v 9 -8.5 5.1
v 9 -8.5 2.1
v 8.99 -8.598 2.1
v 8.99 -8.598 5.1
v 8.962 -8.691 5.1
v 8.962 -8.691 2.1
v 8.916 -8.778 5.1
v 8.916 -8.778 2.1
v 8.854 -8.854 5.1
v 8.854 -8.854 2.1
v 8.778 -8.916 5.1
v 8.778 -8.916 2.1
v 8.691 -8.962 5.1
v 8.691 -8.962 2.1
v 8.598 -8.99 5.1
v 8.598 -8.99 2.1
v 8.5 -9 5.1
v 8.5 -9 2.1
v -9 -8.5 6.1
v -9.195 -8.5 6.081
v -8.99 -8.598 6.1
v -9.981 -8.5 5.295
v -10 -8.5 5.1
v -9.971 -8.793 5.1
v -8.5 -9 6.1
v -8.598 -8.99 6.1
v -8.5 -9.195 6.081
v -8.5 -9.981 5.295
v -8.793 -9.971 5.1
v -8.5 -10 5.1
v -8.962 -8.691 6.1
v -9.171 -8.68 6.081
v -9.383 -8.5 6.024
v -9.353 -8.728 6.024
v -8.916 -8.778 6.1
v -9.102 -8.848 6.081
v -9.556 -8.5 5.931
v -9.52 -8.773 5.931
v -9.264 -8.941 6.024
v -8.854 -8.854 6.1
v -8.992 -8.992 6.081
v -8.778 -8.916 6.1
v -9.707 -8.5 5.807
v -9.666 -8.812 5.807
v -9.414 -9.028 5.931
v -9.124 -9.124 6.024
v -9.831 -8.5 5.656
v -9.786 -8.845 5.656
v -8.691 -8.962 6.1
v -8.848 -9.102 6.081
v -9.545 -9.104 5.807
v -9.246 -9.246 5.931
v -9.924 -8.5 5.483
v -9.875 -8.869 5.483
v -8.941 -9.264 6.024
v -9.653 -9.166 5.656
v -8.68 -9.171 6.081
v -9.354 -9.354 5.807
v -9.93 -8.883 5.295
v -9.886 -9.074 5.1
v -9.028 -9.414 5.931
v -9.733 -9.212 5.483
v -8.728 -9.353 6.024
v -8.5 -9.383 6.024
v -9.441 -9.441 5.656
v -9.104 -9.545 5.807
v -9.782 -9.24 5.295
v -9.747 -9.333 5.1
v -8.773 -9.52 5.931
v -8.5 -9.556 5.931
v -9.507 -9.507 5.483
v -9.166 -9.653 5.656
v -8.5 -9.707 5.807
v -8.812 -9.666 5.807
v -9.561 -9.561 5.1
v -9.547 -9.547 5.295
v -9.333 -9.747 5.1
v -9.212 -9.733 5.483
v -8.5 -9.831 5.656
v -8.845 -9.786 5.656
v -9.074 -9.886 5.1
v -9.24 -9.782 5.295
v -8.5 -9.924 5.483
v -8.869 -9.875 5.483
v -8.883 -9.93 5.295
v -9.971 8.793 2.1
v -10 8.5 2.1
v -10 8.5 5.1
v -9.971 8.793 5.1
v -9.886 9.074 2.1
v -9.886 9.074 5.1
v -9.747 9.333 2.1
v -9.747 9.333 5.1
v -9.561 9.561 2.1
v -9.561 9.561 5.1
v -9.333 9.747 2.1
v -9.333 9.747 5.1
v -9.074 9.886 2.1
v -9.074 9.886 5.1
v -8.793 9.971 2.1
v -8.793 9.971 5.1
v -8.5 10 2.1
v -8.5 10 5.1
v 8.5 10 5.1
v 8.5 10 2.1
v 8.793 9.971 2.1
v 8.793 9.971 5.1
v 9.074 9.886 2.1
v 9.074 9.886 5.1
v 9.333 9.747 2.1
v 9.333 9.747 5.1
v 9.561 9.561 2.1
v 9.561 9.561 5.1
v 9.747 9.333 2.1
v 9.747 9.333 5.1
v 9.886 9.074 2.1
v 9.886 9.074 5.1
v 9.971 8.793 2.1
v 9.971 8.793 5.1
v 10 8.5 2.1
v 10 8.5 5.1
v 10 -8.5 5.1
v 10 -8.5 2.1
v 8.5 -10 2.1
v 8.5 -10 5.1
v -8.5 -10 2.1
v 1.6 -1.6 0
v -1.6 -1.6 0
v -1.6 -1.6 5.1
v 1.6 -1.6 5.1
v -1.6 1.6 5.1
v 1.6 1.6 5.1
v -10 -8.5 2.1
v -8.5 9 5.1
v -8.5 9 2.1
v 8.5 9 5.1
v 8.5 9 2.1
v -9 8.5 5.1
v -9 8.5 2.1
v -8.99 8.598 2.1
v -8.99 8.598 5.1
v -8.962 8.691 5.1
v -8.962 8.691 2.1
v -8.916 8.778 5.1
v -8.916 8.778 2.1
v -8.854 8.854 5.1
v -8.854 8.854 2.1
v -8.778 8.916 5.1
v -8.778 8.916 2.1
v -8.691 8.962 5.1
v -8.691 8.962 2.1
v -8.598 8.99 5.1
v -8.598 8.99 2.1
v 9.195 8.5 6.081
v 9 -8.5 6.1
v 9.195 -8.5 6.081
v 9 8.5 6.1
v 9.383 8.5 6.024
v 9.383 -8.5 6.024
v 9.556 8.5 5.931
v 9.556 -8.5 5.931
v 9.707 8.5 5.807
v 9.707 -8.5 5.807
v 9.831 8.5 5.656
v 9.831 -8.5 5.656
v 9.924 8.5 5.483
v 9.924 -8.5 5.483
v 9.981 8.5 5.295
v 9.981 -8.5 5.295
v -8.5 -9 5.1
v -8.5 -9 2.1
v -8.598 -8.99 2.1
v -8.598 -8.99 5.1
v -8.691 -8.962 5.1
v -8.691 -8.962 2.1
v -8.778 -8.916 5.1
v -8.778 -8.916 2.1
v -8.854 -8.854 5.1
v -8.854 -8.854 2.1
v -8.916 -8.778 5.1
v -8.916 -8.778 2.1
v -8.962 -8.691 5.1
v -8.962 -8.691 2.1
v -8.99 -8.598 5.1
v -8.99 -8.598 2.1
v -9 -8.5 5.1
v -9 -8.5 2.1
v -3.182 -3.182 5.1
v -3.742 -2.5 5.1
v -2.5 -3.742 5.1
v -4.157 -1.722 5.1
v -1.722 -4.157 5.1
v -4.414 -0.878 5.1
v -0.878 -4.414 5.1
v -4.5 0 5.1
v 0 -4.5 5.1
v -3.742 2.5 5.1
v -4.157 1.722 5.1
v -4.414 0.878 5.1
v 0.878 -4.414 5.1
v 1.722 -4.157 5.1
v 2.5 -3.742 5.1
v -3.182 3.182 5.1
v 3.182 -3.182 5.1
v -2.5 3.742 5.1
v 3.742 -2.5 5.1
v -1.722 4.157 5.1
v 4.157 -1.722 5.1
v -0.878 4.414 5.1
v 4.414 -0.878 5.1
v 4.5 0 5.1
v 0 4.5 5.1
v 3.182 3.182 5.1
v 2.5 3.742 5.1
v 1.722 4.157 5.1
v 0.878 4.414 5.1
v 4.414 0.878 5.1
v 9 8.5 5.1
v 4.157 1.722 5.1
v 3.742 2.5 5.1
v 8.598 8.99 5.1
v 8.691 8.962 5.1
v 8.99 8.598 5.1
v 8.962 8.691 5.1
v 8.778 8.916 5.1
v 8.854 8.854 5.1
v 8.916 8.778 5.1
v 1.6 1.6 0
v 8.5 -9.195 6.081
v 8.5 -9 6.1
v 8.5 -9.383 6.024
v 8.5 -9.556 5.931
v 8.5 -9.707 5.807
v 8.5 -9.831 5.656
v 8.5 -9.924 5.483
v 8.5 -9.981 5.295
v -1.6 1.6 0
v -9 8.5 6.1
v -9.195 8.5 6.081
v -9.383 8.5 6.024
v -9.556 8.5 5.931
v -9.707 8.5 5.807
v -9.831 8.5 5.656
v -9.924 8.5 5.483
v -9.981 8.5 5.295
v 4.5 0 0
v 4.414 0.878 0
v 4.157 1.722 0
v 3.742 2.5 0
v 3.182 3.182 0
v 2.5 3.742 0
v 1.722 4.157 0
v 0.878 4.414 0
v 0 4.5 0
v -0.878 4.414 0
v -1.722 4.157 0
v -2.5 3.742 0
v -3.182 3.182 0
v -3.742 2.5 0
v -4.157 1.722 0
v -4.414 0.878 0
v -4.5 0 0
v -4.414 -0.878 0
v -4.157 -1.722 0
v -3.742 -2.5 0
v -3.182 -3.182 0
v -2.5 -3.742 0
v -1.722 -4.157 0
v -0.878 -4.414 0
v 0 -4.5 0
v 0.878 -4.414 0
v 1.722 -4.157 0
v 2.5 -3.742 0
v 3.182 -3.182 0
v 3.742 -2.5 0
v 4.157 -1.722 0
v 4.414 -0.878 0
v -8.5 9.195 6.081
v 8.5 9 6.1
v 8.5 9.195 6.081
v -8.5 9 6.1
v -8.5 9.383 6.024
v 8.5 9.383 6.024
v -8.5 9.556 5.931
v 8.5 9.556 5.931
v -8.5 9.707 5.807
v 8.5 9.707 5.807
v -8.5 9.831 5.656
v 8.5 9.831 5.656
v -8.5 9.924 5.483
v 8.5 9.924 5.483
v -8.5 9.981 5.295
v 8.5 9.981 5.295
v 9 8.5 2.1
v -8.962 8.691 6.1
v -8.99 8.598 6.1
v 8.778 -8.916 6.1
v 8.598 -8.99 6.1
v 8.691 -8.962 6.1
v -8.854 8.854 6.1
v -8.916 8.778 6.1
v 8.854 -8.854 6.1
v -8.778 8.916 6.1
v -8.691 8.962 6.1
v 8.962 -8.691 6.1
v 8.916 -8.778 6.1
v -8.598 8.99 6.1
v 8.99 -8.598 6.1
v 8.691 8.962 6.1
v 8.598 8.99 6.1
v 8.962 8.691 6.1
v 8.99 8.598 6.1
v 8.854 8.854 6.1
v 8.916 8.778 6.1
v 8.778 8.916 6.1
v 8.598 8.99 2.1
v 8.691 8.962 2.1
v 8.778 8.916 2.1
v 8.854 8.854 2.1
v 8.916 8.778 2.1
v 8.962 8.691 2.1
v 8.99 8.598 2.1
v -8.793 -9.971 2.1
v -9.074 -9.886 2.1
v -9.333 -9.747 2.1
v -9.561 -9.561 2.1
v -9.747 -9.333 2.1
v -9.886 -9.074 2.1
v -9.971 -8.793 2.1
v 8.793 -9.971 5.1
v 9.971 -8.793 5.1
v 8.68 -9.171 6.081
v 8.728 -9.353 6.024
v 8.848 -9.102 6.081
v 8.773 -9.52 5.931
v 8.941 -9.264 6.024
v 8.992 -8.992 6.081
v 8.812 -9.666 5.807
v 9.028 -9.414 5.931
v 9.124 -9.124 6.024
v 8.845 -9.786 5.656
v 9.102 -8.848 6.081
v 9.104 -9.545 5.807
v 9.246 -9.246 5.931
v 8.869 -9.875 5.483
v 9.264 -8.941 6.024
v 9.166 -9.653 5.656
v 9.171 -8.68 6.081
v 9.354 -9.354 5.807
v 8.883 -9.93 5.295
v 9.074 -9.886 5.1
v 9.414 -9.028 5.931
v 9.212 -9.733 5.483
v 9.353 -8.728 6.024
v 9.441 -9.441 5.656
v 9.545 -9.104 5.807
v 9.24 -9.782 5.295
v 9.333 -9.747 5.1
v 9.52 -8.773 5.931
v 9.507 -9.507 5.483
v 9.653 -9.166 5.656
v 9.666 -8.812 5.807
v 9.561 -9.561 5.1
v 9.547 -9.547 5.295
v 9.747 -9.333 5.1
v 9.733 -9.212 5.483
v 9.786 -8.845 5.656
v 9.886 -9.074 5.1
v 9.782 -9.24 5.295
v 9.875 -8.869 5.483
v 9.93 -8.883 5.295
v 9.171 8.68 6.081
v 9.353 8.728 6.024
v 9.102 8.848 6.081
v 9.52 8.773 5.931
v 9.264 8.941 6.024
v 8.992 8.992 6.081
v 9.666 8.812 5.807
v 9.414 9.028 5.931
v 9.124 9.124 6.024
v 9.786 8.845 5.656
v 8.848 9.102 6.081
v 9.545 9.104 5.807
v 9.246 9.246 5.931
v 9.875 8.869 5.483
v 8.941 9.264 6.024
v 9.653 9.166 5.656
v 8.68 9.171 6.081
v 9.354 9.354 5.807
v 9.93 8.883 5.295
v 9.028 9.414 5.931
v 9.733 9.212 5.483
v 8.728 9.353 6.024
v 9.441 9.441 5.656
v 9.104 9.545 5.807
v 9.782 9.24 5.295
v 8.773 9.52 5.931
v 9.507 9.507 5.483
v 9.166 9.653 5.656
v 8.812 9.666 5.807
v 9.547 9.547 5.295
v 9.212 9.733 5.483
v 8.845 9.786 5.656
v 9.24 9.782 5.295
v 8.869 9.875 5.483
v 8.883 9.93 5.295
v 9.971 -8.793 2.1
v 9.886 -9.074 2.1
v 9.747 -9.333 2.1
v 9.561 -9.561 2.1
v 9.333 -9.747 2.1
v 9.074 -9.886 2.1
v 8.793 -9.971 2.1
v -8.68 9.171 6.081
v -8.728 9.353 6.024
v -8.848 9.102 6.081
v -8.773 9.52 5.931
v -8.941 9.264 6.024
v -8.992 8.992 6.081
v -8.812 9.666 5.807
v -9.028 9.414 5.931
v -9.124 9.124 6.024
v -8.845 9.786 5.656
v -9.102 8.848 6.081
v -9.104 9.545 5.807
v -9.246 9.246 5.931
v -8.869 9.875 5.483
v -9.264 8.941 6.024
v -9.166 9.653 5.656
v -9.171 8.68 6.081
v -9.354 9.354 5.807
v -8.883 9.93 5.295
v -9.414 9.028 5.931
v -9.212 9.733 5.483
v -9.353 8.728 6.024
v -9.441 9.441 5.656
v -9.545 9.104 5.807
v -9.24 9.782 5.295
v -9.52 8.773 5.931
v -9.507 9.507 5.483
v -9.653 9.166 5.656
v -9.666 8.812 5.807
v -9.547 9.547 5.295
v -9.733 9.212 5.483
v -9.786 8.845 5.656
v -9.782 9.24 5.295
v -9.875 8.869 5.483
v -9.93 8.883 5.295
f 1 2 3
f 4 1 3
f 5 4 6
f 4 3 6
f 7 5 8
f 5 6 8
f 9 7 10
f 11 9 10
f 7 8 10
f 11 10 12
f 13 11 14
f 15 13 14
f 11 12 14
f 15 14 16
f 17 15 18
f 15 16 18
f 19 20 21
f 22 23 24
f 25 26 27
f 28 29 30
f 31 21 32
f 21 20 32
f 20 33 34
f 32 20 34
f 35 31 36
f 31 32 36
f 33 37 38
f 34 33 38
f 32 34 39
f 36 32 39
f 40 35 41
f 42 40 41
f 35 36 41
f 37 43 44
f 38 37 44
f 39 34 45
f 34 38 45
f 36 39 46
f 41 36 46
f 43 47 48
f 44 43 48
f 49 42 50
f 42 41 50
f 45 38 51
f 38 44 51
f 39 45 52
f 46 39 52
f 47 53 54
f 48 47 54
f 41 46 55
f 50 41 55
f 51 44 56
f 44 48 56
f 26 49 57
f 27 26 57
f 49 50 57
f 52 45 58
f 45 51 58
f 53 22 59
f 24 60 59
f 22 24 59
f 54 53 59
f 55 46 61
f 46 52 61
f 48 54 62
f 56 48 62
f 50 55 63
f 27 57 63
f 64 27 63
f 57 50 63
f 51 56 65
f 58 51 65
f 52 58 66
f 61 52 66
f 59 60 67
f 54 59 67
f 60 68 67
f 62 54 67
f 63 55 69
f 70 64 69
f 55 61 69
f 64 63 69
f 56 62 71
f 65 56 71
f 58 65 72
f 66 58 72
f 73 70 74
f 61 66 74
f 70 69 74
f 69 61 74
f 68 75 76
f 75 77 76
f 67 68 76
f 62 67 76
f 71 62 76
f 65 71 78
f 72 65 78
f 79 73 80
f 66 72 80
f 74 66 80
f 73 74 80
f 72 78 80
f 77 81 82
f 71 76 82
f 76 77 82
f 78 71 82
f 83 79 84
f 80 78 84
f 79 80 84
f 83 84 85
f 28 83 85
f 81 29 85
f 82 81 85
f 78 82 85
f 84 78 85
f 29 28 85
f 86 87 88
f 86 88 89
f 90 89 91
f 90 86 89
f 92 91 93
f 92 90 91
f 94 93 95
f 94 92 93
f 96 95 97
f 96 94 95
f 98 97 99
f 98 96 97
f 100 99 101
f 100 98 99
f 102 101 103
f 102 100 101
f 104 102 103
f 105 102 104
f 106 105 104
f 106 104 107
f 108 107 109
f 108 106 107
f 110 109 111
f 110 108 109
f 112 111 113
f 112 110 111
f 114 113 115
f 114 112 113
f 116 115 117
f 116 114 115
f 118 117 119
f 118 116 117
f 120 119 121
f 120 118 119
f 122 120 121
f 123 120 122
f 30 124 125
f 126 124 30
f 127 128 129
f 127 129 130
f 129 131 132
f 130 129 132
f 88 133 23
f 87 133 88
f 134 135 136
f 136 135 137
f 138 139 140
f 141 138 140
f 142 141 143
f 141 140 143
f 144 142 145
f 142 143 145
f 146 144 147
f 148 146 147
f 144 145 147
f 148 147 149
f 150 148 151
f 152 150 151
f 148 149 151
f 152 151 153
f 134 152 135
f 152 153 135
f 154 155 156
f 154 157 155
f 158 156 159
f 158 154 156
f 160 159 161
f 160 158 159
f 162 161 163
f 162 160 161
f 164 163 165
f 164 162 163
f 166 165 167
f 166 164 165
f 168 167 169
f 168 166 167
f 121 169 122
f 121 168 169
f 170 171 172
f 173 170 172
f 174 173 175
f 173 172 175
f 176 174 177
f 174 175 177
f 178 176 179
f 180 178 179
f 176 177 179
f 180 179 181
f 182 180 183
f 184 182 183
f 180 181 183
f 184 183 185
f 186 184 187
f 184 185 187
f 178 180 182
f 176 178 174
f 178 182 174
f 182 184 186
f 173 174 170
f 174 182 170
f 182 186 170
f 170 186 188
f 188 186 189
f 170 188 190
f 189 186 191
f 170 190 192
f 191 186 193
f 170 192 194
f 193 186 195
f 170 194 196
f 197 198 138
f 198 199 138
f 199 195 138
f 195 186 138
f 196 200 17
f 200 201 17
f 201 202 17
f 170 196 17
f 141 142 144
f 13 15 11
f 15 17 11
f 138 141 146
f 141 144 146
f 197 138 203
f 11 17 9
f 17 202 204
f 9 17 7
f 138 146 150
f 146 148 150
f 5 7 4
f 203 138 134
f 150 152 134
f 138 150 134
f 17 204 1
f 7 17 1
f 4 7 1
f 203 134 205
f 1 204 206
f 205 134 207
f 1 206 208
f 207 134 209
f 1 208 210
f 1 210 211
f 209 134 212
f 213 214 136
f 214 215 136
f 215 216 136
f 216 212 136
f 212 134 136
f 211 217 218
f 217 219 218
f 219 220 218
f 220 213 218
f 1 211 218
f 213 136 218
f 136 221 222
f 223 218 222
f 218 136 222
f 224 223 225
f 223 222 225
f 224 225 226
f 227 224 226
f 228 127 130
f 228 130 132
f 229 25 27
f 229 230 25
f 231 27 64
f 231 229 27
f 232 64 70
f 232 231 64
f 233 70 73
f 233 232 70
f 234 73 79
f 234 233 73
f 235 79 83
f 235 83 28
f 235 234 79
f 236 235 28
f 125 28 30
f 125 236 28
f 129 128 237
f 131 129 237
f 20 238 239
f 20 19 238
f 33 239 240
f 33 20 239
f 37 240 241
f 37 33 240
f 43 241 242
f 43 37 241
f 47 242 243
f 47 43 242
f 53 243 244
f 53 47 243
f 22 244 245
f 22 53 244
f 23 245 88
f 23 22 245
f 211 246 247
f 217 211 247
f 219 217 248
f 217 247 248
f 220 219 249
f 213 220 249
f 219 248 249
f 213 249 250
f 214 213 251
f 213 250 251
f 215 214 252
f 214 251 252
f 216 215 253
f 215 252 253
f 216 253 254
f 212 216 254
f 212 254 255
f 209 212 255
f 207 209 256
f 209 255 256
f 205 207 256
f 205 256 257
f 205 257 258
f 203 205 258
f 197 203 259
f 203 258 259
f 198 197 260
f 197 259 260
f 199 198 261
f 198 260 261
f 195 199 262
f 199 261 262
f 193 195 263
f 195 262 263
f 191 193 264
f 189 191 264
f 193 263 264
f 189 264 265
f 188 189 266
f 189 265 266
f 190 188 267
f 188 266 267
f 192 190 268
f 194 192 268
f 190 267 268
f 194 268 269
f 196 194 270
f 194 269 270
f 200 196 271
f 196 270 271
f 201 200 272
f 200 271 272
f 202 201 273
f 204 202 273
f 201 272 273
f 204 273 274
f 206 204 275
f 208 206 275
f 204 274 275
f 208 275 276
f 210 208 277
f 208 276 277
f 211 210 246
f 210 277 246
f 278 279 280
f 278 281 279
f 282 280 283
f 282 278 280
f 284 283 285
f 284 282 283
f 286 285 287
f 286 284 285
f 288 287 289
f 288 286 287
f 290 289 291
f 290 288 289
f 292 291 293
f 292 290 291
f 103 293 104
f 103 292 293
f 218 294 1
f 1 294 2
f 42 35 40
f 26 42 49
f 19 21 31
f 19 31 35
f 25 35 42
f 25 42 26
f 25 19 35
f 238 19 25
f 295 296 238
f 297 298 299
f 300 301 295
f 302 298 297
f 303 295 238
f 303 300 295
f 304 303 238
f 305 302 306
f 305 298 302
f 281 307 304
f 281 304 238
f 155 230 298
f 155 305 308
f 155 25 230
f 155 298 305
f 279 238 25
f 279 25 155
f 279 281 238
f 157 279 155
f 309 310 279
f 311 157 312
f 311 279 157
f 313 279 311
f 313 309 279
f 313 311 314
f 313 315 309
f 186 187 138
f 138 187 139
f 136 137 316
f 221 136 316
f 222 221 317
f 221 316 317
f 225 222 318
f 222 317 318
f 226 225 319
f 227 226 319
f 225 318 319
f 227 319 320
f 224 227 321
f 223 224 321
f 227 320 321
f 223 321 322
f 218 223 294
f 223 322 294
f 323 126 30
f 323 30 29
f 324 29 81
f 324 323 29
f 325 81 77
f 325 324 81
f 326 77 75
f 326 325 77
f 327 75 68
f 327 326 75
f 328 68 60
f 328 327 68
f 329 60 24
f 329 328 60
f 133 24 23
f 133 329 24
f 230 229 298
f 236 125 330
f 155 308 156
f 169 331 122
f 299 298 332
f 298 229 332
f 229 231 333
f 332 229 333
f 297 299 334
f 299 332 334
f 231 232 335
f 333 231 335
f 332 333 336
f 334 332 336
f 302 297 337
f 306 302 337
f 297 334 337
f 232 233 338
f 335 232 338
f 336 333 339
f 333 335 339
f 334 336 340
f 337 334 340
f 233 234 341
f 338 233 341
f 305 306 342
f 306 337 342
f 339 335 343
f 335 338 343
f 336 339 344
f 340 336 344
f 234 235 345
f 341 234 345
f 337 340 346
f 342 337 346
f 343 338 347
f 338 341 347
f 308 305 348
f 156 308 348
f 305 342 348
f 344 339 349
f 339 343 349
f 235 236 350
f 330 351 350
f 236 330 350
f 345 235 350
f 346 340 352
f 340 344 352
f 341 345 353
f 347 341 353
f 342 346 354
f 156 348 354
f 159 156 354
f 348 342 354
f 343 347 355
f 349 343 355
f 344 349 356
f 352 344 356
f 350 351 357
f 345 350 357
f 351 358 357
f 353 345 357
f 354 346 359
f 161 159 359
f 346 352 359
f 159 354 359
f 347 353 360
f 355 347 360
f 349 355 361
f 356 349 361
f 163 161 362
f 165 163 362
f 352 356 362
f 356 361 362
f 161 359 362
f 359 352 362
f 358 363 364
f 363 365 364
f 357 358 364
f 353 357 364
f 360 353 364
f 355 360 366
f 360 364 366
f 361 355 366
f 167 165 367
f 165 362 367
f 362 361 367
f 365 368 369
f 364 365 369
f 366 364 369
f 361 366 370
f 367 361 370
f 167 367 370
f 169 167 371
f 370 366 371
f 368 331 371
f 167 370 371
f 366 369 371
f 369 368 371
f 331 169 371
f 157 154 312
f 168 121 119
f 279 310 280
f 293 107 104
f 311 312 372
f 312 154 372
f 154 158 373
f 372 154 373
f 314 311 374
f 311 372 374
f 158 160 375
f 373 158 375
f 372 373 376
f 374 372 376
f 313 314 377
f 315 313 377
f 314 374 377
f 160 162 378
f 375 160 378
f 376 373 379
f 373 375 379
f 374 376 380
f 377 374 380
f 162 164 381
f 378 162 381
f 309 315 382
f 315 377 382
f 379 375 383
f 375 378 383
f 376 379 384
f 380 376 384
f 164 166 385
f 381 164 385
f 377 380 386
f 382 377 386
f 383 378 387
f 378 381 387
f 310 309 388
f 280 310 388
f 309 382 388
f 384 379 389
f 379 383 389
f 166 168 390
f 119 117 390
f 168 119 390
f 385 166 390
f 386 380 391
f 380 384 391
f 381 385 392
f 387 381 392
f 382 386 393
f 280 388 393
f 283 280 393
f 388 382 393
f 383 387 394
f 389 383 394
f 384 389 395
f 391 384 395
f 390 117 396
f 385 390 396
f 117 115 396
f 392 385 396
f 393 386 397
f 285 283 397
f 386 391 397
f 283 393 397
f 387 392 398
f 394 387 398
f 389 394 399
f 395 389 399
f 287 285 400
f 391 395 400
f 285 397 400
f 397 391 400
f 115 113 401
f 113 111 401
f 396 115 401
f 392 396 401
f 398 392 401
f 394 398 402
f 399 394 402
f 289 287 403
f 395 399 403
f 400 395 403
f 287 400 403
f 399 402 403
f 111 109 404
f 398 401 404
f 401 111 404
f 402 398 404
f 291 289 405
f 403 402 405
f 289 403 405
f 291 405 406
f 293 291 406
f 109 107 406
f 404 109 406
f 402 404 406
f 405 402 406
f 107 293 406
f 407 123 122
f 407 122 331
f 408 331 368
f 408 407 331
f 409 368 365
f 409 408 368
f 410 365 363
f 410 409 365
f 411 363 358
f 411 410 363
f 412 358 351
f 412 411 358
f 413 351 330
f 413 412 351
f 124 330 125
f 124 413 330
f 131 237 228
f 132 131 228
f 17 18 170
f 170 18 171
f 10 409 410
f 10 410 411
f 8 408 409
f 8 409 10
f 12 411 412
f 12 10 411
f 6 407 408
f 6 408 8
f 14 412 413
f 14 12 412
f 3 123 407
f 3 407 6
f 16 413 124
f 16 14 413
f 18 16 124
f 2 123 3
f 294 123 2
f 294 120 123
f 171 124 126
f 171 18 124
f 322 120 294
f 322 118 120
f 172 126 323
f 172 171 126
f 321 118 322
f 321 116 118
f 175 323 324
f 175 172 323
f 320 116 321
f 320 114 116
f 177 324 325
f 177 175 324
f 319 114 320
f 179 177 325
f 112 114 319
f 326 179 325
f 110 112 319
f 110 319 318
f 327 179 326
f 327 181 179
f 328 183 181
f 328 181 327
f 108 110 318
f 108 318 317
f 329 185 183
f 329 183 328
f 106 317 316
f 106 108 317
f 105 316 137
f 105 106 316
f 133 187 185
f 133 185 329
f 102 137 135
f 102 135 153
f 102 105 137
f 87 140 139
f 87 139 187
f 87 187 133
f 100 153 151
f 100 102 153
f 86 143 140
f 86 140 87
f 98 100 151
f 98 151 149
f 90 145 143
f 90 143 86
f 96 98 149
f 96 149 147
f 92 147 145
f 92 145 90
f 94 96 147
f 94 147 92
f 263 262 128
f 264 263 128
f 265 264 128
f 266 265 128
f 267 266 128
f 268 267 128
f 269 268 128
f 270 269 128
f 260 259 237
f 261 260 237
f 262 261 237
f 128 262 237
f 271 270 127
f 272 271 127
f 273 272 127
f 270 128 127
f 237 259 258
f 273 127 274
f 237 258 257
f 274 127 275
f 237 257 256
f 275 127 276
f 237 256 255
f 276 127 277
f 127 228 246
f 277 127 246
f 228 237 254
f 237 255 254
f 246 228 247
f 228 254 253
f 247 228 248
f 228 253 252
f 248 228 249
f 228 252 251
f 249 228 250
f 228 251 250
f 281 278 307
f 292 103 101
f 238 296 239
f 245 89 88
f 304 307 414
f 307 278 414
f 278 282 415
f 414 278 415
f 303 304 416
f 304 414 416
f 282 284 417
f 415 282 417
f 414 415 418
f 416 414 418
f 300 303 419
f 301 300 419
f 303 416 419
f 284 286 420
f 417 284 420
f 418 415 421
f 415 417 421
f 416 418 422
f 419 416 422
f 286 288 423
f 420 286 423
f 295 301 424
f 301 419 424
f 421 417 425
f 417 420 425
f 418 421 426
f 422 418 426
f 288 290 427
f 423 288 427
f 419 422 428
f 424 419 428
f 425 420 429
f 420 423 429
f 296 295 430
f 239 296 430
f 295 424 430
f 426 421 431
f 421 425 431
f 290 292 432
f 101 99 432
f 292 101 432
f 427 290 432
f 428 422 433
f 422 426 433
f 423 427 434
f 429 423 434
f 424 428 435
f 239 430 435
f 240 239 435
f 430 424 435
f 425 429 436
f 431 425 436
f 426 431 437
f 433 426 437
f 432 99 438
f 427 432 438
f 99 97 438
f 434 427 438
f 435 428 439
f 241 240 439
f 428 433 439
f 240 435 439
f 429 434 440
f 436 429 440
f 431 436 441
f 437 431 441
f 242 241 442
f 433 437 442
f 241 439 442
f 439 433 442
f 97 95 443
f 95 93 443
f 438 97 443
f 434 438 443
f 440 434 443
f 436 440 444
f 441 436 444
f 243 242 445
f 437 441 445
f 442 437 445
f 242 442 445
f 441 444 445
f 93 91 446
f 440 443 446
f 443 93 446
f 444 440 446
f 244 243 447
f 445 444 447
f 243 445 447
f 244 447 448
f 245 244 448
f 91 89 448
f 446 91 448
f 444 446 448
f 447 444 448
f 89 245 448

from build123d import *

# Parameters (mm, degrees)
SKETCH1_R           = 4.5
SKETCH1_W           = 3.2
SKETCH1_H           = 3.2
BOSS_EXTRUDE1_DEPTH = 5.1
BOSS_EXTRUDE2_DEPTH = 1
BOSS_EXTRUDE3_START = 3
BOSS_EXTRUDE3_DEPTH = 3
FILLET1_R           = 1


with BuildPart() as part:
    # Sketch1 → Boss-Extrude1 (new body)
    with BuildSketch(Plane.XY):
        Circle(SKETCH1_R)
        Rectangle(SKETCH1_W, SKETCH1_H, mode=Mode.SUBTRACT)
    extrude(amount=BOSS_EXTRUDE1_DEPTH)

    # Sketch2 → Boss-Extrude2 (add)
    with BuildSketch(Plane.XY.offset(5.1)):
        with BuildLine():
            Line((-8.5, -10), (8.5, -10))
            ThreePointArc((8.5, -10), (9.560660172, -9.560660172), (10, -8.5))
            Line((10, -8.5), (10, 8.5))
            ThreePointArc((10, 8.5), (9.560660172, 9.560660172), (8.5, 10))
            Line((8.5, 10), (-8.5, 10))
            ThreePointArc((-8.5, 10), (-9.560660172, 9.560660172), (-10, 8.5))
            Line((-10, 8.5), (-10, -8.5))
            ThreePointArc((-10, -8.5), (-9.560660172, -9.560660172), (-8.5, -10))
        make_face()
    extrude(amount=BOSS_EXTRUDE2_DEPTH)

    # Sketch3 → Boss-Extrude3 (add)
    with BuildSketch(Plane(origin=(0, 0, 5.1), x_dir=(-1, 0, 0), z_dir=(0, 0, -1)).offset(BOSS_EXTRUDE3_START)):
        with BuildLine():
            Line((-8.5, -10), (8.5, -10))
            ThreePointArc((8.5, -10), (9.560660172, -9.560660172), (10, -8.5))
            Line((10, -8.5), (10, 8.5))
            ThreePointArc((10, 8.5), (9.560660172, 9.560660172), (8.5, 10))
            Line((8.5, 10), (-8.5, 10))
            ThreePointArc((-8.5, 10), (-9.560660172, 9.560660172), (-10, 8.5))
            Line((-10, 8.5), (-10, -8.5))
            ThreePointArc((-10, -8.5), (-9.560660172, -9.560660172), (-8.5, -10))
        make_face()
        with BuildLine():
            Line((8.5, 9), (-8.5, 9))
            ThreePointArc((-8.5, 9), (-8.853553391, 8.853553391), (-9, 8.5))
            Line((-9, 8.5), (-9, -8.5))
            ThreePointArc((-9, -8.5), (-8.853553391, -8.853553391), (-8.5, -9))
            Line((-8.5, -9), (8.5, -9))
            ThreePointArc((8.5, -9), (8.853553391, -8.853553391), (9, -8.5))
            Line((9, -8.5), (9, 8.5))
            ThreePointArc((9, 8.5), (8.853553391, 8.853553391), (8.5, 9))
        make_face(mode=Mode.SUBTRACT)
    extrude(amount=-BOSS_EXTRUDE3_DEPTH)

    # Fillet1
    fillet1_edges = [part.edges().sort_by_distance(p)[0] for p in [
        (9.560660172, -9.560660172, 6.1),
        (10, 0, 6.1),
        (9.560660172, 9.560660172, 6.1),
        (0, 10, 6.1),
        (-9.560660172, 9.560660172, 6.1),
        (-10, 0, 6.1),
        (-9.560660172, -9.560660172, 6.1),
        (0, -10, 6.1),
    ]]
    fillet(fillet1_edges, radius=FILLET1_R)


solid = part.part
